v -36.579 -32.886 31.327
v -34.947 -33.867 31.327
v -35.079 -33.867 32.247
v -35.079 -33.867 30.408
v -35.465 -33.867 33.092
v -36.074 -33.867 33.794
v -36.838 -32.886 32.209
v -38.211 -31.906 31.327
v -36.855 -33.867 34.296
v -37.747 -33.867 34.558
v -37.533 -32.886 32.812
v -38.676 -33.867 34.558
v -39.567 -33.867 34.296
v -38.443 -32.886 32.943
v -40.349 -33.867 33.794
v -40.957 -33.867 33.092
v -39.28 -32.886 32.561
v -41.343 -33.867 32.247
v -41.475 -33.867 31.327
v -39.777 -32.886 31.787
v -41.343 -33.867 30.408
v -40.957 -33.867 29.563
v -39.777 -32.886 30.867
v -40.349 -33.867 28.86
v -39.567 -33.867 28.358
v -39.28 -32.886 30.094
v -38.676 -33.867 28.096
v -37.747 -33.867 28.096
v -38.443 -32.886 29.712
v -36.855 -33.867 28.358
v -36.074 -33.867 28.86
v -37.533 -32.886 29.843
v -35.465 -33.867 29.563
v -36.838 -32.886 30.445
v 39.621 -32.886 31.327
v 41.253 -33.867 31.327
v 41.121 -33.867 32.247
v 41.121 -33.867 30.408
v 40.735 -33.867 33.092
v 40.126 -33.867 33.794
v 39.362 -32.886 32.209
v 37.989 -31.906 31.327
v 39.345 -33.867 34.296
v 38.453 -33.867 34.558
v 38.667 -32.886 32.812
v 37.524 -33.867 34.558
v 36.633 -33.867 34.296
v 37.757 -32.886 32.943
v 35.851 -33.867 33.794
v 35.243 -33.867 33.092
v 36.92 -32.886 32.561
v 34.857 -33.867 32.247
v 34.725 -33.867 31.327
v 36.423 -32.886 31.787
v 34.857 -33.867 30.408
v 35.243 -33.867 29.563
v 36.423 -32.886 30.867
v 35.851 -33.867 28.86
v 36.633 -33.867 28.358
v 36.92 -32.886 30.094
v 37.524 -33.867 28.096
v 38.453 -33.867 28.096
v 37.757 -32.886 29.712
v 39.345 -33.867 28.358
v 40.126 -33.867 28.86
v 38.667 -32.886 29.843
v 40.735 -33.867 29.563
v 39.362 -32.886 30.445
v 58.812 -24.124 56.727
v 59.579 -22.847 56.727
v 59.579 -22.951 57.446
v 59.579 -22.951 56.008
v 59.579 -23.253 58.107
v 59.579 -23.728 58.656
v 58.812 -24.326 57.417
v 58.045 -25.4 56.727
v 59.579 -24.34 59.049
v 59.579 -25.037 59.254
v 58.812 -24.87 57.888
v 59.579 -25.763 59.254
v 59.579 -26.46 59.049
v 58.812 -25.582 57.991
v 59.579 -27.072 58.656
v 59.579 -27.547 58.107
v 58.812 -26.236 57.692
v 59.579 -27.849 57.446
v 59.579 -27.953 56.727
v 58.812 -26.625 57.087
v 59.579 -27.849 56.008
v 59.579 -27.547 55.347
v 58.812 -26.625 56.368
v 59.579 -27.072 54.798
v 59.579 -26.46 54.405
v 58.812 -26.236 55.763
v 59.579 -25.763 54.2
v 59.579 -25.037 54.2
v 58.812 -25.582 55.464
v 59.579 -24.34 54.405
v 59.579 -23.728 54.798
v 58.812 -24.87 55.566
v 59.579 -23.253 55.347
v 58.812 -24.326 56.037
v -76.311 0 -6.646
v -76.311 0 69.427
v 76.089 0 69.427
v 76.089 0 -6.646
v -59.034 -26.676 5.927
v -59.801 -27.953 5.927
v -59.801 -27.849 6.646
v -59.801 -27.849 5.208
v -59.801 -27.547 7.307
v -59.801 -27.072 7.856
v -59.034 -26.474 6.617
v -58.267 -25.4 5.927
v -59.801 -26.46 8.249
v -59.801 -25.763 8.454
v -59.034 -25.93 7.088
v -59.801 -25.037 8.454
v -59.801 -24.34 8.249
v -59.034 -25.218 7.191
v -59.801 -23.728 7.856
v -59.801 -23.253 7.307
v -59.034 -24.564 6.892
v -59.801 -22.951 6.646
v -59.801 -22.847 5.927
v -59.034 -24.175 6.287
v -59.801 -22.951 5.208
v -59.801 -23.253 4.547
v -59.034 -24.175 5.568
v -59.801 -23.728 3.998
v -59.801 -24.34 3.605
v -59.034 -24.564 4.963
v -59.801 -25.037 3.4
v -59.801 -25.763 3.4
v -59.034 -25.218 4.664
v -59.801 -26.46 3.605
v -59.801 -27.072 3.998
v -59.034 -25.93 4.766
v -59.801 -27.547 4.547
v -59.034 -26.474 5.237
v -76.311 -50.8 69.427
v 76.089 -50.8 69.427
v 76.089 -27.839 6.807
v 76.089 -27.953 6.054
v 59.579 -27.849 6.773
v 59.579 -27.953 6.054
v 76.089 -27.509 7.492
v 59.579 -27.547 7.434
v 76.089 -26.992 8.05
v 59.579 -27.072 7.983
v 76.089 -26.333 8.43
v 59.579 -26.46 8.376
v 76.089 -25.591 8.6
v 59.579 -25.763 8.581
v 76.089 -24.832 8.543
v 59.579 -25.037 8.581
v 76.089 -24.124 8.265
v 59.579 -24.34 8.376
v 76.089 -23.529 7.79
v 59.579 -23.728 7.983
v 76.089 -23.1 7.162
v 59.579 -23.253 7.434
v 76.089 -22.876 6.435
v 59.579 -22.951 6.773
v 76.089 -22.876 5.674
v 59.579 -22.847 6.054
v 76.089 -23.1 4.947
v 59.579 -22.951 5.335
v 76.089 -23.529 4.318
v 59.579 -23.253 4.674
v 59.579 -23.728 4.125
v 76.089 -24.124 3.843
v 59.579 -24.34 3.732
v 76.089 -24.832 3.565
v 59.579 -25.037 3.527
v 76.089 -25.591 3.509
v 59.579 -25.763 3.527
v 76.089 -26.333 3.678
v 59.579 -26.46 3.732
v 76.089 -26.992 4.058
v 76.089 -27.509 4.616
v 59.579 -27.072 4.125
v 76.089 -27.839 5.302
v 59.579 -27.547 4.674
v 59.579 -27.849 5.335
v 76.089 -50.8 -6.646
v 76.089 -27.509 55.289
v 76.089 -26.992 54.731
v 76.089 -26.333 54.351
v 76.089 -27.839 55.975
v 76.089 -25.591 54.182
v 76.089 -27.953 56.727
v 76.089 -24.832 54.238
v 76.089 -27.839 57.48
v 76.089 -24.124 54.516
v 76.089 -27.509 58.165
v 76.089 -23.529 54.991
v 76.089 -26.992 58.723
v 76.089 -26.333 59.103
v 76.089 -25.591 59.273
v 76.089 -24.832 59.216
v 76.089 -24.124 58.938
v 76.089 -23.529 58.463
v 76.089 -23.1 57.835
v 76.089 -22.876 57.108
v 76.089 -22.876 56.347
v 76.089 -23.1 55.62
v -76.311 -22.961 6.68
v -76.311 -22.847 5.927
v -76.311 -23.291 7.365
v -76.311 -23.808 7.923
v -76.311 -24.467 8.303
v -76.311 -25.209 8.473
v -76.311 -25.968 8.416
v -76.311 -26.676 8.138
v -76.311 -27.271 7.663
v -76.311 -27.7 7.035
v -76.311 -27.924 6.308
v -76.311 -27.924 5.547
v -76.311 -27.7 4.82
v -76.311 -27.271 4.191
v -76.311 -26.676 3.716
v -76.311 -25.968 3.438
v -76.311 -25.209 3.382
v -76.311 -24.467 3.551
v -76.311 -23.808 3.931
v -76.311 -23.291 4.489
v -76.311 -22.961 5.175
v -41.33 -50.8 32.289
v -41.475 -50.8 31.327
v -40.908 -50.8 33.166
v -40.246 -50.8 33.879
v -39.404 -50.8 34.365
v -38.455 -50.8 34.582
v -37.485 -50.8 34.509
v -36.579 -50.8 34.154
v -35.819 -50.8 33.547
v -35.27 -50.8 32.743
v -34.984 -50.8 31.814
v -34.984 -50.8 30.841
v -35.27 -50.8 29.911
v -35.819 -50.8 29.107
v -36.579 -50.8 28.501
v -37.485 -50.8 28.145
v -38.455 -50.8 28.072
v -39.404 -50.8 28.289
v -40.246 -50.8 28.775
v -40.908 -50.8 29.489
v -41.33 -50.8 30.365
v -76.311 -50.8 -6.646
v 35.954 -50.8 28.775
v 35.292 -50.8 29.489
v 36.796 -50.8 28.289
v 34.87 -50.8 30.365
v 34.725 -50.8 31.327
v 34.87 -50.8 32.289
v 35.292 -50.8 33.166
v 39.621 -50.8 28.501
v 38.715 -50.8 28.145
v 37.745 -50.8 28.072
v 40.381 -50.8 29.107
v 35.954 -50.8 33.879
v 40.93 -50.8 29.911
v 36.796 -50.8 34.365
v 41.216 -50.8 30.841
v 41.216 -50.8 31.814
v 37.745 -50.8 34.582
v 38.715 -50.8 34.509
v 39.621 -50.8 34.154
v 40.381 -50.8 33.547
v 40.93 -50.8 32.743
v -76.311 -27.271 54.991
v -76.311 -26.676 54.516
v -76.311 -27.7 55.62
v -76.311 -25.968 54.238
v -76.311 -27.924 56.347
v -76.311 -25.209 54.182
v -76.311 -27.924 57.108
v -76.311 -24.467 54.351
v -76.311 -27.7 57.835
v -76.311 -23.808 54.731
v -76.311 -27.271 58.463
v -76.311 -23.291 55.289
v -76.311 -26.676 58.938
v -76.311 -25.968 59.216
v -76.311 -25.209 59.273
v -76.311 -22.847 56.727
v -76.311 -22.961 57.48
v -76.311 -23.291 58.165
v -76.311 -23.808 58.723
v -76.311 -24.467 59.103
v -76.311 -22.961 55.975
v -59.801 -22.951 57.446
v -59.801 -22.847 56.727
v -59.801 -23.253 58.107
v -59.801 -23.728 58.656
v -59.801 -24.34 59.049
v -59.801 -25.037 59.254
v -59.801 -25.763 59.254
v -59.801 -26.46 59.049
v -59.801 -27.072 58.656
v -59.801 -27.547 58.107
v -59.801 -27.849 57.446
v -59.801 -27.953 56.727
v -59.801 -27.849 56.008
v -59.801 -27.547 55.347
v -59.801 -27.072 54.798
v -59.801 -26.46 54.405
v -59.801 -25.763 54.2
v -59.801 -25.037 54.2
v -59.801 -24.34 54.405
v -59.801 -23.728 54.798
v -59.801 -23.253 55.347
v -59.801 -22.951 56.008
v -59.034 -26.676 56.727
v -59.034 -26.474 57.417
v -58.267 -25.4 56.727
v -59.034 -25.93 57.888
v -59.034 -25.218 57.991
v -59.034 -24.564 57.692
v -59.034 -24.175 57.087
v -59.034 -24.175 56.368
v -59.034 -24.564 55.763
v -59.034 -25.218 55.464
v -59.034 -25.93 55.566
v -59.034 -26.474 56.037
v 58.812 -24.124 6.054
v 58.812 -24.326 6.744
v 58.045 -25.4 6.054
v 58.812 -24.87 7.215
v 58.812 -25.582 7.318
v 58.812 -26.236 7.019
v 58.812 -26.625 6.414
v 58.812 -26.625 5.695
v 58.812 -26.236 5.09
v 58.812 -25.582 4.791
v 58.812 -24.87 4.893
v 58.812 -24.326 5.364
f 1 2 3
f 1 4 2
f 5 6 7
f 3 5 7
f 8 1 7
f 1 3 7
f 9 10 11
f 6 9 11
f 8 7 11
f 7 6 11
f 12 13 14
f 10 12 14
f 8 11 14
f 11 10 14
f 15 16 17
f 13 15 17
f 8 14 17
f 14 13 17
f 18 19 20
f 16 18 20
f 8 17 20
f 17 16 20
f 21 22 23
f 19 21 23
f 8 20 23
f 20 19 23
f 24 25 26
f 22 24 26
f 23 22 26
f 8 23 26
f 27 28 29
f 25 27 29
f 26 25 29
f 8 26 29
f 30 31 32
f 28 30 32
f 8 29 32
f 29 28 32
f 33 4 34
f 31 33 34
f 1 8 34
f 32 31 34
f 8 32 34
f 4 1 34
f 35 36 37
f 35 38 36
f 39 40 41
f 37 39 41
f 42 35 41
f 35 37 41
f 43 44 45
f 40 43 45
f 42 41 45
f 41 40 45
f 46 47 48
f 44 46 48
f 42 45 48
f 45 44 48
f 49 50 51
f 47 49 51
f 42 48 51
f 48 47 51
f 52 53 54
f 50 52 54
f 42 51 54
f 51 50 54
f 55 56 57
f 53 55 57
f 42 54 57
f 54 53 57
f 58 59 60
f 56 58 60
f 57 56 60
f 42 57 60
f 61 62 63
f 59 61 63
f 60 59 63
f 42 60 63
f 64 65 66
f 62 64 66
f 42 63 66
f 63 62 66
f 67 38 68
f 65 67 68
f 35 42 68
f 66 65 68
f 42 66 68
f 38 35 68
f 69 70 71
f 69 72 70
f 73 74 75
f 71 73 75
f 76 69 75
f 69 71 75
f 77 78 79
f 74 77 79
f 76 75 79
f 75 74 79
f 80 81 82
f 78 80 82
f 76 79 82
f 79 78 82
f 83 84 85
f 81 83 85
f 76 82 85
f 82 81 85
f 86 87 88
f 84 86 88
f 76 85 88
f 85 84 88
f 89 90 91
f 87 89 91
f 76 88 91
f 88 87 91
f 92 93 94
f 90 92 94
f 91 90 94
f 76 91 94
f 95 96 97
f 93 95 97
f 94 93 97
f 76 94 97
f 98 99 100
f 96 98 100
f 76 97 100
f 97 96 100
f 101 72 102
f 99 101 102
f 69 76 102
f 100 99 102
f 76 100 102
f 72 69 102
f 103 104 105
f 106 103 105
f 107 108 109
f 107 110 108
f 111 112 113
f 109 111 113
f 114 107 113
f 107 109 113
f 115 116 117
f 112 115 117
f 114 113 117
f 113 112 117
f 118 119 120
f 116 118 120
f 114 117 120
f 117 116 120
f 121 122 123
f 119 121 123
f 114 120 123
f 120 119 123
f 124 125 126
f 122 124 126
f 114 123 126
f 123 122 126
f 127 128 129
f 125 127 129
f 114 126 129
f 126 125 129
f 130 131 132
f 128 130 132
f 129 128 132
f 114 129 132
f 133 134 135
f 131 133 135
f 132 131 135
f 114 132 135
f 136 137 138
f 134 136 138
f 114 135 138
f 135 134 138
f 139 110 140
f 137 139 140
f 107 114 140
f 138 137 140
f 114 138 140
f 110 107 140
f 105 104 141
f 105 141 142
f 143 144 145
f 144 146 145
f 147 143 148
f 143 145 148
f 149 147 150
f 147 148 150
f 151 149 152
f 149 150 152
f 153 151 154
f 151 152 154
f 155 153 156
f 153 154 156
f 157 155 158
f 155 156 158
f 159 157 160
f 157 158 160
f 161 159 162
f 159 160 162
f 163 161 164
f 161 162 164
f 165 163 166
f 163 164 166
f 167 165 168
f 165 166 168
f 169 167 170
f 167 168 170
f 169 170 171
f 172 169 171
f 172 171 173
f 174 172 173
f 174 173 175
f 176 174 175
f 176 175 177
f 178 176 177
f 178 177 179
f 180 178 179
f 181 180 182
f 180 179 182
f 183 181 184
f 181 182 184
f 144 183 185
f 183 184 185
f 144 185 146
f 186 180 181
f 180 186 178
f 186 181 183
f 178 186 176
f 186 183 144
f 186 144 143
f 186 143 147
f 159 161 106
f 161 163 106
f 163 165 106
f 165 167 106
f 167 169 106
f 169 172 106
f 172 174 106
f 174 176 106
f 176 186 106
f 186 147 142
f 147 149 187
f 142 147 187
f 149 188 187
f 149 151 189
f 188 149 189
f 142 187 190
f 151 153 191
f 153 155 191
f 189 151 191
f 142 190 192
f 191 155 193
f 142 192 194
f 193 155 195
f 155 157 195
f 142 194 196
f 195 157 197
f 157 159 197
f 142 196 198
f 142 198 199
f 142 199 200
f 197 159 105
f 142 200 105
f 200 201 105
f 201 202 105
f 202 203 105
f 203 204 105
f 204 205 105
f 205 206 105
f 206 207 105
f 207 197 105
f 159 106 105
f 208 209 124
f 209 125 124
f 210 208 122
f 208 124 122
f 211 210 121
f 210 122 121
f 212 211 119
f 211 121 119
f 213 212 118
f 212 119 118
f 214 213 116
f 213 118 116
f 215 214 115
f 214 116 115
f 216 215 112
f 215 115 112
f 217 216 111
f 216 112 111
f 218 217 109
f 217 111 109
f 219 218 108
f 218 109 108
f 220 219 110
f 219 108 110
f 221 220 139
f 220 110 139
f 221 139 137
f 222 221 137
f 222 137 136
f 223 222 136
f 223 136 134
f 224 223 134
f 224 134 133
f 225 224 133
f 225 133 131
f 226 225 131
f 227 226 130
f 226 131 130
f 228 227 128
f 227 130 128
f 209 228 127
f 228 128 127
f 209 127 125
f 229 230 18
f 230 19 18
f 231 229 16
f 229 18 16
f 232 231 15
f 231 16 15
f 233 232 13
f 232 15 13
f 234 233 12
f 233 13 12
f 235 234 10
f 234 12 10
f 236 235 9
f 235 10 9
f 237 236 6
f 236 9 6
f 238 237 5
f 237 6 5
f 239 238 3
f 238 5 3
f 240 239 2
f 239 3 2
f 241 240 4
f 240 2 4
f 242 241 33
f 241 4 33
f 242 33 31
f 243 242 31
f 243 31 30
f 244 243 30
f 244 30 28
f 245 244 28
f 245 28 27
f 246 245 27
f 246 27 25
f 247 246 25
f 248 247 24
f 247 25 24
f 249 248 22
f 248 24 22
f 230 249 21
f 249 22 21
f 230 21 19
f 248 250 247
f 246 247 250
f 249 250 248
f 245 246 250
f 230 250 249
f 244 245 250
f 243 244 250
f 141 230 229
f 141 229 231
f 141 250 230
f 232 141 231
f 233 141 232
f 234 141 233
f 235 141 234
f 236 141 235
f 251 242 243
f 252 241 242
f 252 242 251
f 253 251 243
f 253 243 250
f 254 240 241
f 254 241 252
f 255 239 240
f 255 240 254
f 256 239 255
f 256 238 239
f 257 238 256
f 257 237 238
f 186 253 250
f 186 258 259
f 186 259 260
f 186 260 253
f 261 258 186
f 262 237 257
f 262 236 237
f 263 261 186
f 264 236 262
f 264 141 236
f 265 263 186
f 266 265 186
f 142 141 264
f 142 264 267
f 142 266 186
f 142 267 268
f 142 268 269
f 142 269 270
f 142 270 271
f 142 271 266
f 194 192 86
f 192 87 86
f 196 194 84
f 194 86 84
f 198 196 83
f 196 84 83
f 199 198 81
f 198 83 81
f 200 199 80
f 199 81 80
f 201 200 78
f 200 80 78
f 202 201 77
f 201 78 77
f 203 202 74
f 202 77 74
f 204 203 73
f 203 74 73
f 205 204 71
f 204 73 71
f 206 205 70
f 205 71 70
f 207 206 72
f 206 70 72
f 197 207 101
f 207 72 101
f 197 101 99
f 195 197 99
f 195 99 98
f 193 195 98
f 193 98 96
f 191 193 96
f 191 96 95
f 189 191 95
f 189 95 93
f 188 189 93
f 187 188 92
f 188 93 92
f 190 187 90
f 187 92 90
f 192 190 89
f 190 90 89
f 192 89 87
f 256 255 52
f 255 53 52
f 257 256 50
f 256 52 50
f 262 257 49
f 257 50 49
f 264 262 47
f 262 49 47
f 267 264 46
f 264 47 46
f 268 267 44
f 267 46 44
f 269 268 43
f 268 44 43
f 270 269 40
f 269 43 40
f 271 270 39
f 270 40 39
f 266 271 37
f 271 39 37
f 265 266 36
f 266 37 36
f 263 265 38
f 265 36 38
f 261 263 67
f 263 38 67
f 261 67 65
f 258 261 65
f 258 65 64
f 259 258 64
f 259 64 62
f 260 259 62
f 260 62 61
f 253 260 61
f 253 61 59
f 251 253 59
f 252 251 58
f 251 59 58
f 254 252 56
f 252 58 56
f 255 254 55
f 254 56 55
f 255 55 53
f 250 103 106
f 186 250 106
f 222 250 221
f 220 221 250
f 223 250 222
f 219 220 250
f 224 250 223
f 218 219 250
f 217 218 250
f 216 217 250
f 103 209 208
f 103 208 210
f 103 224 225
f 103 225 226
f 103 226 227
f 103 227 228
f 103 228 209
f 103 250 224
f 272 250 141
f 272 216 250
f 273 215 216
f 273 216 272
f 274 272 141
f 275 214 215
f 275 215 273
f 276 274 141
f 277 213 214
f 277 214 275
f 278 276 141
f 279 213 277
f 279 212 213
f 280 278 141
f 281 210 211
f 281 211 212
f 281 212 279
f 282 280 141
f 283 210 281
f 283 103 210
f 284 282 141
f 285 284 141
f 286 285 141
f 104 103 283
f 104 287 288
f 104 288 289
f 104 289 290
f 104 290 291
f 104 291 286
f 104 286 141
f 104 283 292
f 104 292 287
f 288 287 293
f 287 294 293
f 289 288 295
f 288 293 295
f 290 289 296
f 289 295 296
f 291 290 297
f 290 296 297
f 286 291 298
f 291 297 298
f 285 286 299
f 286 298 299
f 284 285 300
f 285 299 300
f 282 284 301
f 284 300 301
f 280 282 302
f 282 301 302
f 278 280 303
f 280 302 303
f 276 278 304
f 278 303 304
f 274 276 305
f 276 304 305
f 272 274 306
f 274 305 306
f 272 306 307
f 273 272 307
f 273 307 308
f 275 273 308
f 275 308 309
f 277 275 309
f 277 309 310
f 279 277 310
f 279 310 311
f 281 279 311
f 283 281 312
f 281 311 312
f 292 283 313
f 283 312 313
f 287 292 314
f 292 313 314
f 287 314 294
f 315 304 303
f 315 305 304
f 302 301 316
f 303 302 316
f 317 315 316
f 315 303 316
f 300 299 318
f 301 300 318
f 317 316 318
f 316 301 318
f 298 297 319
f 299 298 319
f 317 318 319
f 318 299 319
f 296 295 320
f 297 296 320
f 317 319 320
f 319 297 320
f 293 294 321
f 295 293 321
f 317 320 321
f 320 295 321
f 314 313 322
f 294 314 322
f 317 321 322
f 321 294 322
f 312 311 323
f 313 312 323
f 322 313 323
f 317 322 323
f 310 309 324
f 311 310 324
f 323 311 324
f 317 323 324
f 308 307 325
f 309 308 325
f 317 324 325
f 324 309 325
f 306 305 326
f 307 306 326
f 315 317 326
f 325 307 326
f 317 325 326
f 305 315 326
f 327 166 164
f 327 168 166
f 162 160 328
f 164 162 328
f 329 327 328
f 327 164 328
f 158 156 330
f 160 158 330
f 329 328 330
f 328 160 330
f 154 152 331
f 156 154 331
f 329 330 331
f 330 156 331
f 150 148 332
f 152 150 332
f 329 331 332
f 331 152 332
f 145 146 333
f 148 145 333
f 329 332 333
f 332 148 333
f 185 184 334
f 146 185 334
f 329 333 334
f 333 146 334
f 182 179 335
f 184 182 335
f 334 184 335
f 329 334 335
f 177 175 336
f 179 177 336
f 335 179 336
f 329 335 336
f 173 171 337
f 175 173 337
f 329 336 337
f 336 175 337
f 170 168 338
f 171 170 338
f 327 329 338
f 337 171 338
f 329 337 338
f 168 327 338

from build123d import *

# Parameters (mm, degrees)
F0_W     = 152.4
F0_H     = 76.073
F1_DEPTH = 50.8
F3_D     = 5.1054
F3_DEPTH = 16.51
F3_TIP   = 1.5338169022
F5_D     = 5.1054
F5_DEPTH = 16.51
F5_TIP   = 1.5338169022
F7_D     = 6.5278
F7_DEPTH = 16.9333333333
F7_TIP   = 1.9611489744


with BuildPart() as f1:
    # F0 (on Front) → F1 (new body)
    with BuildSketch(Plane.XZ):
        with Locations((-0.1111254096, 31.3906762446)):
            Rectangle(F0_W, F0_H)
    extrude(amount=F1_DEPTH)

    # F3
    with Locations(Plane(origin=(-76.3111254096, 0, 0), x_dir=(0, -1, 0), z_dir=(-1, 0, 0))):
        with Locations((25.4, 56.7271762446), (25.4, 5.9271762446)):
            Hole(F3_D / 2, depth=F3_DEPTH)
            with Locations((0, 0, -(F3_DEPTH + F3_TIP / 2))):  # 118° drill point
                Cone(0, F3_D / 2, F3_TIP, mode=Mode.SUBTRACT)

    # F5
    with Locations(Plane.YZ.offset(76.0888745904)):
        with Locations((-25.4, 56.7271762446), (-25.4, 6.0541762446)):
            Hole(F5_D / 2, depth=F5_DEPTH)
            with Locations((0, 0, -(F5_DEPTH + F5_TIP / 2))):  # 118° drill point
                Cone(0, F5_D / 2, F5_TIP, mode=Mode.SUBTRACT)

    # F7
    with Locations(Plane.XZ.offset(50.8)):
        with Locations((-38.2111254096, 31.3271762446), (37.9888745904, 31.3271762446)):
            Hole(F7_D / 2, depth=F7_DEPTH)
            with Locations((0, 0, -(F7_DEPTH + F7_TIP / 2))):  # 118° drill point
                Cone(0, F7_D / 2, F7_TIP, mode=Mode.SUBTRACT)


solid = f1.part
